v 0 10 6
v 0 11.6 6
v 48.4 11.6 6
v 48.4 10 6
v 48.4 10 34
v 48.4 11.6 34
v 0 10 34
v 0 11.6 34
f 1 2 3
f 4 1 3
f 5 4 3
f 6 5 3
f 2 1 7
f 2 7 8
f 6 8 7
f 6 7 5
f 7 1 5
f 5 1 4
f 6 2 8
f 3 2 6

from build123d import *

# Parameters (mm, degrees)
CYLINDER_R       = 1.5
CYLINDER_DEPTH   = 10
ARRAY001_X_COUNT = 2
ARRAY001_X_PITCH = 43.4
ARRAY001_Z_COUNT = 2
ARRAY001_Z_PITCH = 20.4
BOX002_W         = 48.4
BOX002_H         = 1.6
BOX002_DEPTH     = 28


with BuildPart() as hole_array_clone:
    # Cylinder → Cylinder (new body)
    with BuildSketch(Plane(origin=(0, 0, 0), x_dir=(1, 0, 0), z_dir=(0, 1, 0))):
        Circle(CYLINDER_R)
    extrude(amount=CYLINDER_DEPTH)

    # Array001 X: hole array clone ×2


with BuildPart() as hole_array_clone_1:
    add(hole_array_clone.part)
    with Locations(*[(i * ARRAY001_X_PITCH, 0, 0) for i in range(1, ARRAY001_X_COUNT)]):
        add(hole_array_clone.part)

    # Array001 Z: hole array clone ×2


with BuildPart() as hole_array_clone_2:
    add(hole_array_clone_1.part)
    with Locations(*[(0, 0, i * ARRAY001_Z_PITCH) for i in range(1, ARRAY001_Z_COUNT)]):
        add(hole_array_clone_1.part)


with BuildPart() as hole_array_clone_3:
    # Array001 placement: moved
    add(hole_array_clone_2.part.moved(Location((2.5, 0, 9.8))))


with BuildPart() as pcb_mockup:
    # Box002 → Box002 (new body)
    with BuildSketch(Plane(origin=(0, 10, 6), x_dir=(1, 0, 0), z_dir=(0, 0, 1))):
        with Locations((24.2, 0.8)):
            Rectangle(BOX002_W, BOX002_H)
    extrude(amount=BOX002_DEPTH)

    # Cut: cut hole array clone
    add(hole_array_clone_3.part, mode=Mode.SUBTRACT)


solid = pcb_mockup.part
